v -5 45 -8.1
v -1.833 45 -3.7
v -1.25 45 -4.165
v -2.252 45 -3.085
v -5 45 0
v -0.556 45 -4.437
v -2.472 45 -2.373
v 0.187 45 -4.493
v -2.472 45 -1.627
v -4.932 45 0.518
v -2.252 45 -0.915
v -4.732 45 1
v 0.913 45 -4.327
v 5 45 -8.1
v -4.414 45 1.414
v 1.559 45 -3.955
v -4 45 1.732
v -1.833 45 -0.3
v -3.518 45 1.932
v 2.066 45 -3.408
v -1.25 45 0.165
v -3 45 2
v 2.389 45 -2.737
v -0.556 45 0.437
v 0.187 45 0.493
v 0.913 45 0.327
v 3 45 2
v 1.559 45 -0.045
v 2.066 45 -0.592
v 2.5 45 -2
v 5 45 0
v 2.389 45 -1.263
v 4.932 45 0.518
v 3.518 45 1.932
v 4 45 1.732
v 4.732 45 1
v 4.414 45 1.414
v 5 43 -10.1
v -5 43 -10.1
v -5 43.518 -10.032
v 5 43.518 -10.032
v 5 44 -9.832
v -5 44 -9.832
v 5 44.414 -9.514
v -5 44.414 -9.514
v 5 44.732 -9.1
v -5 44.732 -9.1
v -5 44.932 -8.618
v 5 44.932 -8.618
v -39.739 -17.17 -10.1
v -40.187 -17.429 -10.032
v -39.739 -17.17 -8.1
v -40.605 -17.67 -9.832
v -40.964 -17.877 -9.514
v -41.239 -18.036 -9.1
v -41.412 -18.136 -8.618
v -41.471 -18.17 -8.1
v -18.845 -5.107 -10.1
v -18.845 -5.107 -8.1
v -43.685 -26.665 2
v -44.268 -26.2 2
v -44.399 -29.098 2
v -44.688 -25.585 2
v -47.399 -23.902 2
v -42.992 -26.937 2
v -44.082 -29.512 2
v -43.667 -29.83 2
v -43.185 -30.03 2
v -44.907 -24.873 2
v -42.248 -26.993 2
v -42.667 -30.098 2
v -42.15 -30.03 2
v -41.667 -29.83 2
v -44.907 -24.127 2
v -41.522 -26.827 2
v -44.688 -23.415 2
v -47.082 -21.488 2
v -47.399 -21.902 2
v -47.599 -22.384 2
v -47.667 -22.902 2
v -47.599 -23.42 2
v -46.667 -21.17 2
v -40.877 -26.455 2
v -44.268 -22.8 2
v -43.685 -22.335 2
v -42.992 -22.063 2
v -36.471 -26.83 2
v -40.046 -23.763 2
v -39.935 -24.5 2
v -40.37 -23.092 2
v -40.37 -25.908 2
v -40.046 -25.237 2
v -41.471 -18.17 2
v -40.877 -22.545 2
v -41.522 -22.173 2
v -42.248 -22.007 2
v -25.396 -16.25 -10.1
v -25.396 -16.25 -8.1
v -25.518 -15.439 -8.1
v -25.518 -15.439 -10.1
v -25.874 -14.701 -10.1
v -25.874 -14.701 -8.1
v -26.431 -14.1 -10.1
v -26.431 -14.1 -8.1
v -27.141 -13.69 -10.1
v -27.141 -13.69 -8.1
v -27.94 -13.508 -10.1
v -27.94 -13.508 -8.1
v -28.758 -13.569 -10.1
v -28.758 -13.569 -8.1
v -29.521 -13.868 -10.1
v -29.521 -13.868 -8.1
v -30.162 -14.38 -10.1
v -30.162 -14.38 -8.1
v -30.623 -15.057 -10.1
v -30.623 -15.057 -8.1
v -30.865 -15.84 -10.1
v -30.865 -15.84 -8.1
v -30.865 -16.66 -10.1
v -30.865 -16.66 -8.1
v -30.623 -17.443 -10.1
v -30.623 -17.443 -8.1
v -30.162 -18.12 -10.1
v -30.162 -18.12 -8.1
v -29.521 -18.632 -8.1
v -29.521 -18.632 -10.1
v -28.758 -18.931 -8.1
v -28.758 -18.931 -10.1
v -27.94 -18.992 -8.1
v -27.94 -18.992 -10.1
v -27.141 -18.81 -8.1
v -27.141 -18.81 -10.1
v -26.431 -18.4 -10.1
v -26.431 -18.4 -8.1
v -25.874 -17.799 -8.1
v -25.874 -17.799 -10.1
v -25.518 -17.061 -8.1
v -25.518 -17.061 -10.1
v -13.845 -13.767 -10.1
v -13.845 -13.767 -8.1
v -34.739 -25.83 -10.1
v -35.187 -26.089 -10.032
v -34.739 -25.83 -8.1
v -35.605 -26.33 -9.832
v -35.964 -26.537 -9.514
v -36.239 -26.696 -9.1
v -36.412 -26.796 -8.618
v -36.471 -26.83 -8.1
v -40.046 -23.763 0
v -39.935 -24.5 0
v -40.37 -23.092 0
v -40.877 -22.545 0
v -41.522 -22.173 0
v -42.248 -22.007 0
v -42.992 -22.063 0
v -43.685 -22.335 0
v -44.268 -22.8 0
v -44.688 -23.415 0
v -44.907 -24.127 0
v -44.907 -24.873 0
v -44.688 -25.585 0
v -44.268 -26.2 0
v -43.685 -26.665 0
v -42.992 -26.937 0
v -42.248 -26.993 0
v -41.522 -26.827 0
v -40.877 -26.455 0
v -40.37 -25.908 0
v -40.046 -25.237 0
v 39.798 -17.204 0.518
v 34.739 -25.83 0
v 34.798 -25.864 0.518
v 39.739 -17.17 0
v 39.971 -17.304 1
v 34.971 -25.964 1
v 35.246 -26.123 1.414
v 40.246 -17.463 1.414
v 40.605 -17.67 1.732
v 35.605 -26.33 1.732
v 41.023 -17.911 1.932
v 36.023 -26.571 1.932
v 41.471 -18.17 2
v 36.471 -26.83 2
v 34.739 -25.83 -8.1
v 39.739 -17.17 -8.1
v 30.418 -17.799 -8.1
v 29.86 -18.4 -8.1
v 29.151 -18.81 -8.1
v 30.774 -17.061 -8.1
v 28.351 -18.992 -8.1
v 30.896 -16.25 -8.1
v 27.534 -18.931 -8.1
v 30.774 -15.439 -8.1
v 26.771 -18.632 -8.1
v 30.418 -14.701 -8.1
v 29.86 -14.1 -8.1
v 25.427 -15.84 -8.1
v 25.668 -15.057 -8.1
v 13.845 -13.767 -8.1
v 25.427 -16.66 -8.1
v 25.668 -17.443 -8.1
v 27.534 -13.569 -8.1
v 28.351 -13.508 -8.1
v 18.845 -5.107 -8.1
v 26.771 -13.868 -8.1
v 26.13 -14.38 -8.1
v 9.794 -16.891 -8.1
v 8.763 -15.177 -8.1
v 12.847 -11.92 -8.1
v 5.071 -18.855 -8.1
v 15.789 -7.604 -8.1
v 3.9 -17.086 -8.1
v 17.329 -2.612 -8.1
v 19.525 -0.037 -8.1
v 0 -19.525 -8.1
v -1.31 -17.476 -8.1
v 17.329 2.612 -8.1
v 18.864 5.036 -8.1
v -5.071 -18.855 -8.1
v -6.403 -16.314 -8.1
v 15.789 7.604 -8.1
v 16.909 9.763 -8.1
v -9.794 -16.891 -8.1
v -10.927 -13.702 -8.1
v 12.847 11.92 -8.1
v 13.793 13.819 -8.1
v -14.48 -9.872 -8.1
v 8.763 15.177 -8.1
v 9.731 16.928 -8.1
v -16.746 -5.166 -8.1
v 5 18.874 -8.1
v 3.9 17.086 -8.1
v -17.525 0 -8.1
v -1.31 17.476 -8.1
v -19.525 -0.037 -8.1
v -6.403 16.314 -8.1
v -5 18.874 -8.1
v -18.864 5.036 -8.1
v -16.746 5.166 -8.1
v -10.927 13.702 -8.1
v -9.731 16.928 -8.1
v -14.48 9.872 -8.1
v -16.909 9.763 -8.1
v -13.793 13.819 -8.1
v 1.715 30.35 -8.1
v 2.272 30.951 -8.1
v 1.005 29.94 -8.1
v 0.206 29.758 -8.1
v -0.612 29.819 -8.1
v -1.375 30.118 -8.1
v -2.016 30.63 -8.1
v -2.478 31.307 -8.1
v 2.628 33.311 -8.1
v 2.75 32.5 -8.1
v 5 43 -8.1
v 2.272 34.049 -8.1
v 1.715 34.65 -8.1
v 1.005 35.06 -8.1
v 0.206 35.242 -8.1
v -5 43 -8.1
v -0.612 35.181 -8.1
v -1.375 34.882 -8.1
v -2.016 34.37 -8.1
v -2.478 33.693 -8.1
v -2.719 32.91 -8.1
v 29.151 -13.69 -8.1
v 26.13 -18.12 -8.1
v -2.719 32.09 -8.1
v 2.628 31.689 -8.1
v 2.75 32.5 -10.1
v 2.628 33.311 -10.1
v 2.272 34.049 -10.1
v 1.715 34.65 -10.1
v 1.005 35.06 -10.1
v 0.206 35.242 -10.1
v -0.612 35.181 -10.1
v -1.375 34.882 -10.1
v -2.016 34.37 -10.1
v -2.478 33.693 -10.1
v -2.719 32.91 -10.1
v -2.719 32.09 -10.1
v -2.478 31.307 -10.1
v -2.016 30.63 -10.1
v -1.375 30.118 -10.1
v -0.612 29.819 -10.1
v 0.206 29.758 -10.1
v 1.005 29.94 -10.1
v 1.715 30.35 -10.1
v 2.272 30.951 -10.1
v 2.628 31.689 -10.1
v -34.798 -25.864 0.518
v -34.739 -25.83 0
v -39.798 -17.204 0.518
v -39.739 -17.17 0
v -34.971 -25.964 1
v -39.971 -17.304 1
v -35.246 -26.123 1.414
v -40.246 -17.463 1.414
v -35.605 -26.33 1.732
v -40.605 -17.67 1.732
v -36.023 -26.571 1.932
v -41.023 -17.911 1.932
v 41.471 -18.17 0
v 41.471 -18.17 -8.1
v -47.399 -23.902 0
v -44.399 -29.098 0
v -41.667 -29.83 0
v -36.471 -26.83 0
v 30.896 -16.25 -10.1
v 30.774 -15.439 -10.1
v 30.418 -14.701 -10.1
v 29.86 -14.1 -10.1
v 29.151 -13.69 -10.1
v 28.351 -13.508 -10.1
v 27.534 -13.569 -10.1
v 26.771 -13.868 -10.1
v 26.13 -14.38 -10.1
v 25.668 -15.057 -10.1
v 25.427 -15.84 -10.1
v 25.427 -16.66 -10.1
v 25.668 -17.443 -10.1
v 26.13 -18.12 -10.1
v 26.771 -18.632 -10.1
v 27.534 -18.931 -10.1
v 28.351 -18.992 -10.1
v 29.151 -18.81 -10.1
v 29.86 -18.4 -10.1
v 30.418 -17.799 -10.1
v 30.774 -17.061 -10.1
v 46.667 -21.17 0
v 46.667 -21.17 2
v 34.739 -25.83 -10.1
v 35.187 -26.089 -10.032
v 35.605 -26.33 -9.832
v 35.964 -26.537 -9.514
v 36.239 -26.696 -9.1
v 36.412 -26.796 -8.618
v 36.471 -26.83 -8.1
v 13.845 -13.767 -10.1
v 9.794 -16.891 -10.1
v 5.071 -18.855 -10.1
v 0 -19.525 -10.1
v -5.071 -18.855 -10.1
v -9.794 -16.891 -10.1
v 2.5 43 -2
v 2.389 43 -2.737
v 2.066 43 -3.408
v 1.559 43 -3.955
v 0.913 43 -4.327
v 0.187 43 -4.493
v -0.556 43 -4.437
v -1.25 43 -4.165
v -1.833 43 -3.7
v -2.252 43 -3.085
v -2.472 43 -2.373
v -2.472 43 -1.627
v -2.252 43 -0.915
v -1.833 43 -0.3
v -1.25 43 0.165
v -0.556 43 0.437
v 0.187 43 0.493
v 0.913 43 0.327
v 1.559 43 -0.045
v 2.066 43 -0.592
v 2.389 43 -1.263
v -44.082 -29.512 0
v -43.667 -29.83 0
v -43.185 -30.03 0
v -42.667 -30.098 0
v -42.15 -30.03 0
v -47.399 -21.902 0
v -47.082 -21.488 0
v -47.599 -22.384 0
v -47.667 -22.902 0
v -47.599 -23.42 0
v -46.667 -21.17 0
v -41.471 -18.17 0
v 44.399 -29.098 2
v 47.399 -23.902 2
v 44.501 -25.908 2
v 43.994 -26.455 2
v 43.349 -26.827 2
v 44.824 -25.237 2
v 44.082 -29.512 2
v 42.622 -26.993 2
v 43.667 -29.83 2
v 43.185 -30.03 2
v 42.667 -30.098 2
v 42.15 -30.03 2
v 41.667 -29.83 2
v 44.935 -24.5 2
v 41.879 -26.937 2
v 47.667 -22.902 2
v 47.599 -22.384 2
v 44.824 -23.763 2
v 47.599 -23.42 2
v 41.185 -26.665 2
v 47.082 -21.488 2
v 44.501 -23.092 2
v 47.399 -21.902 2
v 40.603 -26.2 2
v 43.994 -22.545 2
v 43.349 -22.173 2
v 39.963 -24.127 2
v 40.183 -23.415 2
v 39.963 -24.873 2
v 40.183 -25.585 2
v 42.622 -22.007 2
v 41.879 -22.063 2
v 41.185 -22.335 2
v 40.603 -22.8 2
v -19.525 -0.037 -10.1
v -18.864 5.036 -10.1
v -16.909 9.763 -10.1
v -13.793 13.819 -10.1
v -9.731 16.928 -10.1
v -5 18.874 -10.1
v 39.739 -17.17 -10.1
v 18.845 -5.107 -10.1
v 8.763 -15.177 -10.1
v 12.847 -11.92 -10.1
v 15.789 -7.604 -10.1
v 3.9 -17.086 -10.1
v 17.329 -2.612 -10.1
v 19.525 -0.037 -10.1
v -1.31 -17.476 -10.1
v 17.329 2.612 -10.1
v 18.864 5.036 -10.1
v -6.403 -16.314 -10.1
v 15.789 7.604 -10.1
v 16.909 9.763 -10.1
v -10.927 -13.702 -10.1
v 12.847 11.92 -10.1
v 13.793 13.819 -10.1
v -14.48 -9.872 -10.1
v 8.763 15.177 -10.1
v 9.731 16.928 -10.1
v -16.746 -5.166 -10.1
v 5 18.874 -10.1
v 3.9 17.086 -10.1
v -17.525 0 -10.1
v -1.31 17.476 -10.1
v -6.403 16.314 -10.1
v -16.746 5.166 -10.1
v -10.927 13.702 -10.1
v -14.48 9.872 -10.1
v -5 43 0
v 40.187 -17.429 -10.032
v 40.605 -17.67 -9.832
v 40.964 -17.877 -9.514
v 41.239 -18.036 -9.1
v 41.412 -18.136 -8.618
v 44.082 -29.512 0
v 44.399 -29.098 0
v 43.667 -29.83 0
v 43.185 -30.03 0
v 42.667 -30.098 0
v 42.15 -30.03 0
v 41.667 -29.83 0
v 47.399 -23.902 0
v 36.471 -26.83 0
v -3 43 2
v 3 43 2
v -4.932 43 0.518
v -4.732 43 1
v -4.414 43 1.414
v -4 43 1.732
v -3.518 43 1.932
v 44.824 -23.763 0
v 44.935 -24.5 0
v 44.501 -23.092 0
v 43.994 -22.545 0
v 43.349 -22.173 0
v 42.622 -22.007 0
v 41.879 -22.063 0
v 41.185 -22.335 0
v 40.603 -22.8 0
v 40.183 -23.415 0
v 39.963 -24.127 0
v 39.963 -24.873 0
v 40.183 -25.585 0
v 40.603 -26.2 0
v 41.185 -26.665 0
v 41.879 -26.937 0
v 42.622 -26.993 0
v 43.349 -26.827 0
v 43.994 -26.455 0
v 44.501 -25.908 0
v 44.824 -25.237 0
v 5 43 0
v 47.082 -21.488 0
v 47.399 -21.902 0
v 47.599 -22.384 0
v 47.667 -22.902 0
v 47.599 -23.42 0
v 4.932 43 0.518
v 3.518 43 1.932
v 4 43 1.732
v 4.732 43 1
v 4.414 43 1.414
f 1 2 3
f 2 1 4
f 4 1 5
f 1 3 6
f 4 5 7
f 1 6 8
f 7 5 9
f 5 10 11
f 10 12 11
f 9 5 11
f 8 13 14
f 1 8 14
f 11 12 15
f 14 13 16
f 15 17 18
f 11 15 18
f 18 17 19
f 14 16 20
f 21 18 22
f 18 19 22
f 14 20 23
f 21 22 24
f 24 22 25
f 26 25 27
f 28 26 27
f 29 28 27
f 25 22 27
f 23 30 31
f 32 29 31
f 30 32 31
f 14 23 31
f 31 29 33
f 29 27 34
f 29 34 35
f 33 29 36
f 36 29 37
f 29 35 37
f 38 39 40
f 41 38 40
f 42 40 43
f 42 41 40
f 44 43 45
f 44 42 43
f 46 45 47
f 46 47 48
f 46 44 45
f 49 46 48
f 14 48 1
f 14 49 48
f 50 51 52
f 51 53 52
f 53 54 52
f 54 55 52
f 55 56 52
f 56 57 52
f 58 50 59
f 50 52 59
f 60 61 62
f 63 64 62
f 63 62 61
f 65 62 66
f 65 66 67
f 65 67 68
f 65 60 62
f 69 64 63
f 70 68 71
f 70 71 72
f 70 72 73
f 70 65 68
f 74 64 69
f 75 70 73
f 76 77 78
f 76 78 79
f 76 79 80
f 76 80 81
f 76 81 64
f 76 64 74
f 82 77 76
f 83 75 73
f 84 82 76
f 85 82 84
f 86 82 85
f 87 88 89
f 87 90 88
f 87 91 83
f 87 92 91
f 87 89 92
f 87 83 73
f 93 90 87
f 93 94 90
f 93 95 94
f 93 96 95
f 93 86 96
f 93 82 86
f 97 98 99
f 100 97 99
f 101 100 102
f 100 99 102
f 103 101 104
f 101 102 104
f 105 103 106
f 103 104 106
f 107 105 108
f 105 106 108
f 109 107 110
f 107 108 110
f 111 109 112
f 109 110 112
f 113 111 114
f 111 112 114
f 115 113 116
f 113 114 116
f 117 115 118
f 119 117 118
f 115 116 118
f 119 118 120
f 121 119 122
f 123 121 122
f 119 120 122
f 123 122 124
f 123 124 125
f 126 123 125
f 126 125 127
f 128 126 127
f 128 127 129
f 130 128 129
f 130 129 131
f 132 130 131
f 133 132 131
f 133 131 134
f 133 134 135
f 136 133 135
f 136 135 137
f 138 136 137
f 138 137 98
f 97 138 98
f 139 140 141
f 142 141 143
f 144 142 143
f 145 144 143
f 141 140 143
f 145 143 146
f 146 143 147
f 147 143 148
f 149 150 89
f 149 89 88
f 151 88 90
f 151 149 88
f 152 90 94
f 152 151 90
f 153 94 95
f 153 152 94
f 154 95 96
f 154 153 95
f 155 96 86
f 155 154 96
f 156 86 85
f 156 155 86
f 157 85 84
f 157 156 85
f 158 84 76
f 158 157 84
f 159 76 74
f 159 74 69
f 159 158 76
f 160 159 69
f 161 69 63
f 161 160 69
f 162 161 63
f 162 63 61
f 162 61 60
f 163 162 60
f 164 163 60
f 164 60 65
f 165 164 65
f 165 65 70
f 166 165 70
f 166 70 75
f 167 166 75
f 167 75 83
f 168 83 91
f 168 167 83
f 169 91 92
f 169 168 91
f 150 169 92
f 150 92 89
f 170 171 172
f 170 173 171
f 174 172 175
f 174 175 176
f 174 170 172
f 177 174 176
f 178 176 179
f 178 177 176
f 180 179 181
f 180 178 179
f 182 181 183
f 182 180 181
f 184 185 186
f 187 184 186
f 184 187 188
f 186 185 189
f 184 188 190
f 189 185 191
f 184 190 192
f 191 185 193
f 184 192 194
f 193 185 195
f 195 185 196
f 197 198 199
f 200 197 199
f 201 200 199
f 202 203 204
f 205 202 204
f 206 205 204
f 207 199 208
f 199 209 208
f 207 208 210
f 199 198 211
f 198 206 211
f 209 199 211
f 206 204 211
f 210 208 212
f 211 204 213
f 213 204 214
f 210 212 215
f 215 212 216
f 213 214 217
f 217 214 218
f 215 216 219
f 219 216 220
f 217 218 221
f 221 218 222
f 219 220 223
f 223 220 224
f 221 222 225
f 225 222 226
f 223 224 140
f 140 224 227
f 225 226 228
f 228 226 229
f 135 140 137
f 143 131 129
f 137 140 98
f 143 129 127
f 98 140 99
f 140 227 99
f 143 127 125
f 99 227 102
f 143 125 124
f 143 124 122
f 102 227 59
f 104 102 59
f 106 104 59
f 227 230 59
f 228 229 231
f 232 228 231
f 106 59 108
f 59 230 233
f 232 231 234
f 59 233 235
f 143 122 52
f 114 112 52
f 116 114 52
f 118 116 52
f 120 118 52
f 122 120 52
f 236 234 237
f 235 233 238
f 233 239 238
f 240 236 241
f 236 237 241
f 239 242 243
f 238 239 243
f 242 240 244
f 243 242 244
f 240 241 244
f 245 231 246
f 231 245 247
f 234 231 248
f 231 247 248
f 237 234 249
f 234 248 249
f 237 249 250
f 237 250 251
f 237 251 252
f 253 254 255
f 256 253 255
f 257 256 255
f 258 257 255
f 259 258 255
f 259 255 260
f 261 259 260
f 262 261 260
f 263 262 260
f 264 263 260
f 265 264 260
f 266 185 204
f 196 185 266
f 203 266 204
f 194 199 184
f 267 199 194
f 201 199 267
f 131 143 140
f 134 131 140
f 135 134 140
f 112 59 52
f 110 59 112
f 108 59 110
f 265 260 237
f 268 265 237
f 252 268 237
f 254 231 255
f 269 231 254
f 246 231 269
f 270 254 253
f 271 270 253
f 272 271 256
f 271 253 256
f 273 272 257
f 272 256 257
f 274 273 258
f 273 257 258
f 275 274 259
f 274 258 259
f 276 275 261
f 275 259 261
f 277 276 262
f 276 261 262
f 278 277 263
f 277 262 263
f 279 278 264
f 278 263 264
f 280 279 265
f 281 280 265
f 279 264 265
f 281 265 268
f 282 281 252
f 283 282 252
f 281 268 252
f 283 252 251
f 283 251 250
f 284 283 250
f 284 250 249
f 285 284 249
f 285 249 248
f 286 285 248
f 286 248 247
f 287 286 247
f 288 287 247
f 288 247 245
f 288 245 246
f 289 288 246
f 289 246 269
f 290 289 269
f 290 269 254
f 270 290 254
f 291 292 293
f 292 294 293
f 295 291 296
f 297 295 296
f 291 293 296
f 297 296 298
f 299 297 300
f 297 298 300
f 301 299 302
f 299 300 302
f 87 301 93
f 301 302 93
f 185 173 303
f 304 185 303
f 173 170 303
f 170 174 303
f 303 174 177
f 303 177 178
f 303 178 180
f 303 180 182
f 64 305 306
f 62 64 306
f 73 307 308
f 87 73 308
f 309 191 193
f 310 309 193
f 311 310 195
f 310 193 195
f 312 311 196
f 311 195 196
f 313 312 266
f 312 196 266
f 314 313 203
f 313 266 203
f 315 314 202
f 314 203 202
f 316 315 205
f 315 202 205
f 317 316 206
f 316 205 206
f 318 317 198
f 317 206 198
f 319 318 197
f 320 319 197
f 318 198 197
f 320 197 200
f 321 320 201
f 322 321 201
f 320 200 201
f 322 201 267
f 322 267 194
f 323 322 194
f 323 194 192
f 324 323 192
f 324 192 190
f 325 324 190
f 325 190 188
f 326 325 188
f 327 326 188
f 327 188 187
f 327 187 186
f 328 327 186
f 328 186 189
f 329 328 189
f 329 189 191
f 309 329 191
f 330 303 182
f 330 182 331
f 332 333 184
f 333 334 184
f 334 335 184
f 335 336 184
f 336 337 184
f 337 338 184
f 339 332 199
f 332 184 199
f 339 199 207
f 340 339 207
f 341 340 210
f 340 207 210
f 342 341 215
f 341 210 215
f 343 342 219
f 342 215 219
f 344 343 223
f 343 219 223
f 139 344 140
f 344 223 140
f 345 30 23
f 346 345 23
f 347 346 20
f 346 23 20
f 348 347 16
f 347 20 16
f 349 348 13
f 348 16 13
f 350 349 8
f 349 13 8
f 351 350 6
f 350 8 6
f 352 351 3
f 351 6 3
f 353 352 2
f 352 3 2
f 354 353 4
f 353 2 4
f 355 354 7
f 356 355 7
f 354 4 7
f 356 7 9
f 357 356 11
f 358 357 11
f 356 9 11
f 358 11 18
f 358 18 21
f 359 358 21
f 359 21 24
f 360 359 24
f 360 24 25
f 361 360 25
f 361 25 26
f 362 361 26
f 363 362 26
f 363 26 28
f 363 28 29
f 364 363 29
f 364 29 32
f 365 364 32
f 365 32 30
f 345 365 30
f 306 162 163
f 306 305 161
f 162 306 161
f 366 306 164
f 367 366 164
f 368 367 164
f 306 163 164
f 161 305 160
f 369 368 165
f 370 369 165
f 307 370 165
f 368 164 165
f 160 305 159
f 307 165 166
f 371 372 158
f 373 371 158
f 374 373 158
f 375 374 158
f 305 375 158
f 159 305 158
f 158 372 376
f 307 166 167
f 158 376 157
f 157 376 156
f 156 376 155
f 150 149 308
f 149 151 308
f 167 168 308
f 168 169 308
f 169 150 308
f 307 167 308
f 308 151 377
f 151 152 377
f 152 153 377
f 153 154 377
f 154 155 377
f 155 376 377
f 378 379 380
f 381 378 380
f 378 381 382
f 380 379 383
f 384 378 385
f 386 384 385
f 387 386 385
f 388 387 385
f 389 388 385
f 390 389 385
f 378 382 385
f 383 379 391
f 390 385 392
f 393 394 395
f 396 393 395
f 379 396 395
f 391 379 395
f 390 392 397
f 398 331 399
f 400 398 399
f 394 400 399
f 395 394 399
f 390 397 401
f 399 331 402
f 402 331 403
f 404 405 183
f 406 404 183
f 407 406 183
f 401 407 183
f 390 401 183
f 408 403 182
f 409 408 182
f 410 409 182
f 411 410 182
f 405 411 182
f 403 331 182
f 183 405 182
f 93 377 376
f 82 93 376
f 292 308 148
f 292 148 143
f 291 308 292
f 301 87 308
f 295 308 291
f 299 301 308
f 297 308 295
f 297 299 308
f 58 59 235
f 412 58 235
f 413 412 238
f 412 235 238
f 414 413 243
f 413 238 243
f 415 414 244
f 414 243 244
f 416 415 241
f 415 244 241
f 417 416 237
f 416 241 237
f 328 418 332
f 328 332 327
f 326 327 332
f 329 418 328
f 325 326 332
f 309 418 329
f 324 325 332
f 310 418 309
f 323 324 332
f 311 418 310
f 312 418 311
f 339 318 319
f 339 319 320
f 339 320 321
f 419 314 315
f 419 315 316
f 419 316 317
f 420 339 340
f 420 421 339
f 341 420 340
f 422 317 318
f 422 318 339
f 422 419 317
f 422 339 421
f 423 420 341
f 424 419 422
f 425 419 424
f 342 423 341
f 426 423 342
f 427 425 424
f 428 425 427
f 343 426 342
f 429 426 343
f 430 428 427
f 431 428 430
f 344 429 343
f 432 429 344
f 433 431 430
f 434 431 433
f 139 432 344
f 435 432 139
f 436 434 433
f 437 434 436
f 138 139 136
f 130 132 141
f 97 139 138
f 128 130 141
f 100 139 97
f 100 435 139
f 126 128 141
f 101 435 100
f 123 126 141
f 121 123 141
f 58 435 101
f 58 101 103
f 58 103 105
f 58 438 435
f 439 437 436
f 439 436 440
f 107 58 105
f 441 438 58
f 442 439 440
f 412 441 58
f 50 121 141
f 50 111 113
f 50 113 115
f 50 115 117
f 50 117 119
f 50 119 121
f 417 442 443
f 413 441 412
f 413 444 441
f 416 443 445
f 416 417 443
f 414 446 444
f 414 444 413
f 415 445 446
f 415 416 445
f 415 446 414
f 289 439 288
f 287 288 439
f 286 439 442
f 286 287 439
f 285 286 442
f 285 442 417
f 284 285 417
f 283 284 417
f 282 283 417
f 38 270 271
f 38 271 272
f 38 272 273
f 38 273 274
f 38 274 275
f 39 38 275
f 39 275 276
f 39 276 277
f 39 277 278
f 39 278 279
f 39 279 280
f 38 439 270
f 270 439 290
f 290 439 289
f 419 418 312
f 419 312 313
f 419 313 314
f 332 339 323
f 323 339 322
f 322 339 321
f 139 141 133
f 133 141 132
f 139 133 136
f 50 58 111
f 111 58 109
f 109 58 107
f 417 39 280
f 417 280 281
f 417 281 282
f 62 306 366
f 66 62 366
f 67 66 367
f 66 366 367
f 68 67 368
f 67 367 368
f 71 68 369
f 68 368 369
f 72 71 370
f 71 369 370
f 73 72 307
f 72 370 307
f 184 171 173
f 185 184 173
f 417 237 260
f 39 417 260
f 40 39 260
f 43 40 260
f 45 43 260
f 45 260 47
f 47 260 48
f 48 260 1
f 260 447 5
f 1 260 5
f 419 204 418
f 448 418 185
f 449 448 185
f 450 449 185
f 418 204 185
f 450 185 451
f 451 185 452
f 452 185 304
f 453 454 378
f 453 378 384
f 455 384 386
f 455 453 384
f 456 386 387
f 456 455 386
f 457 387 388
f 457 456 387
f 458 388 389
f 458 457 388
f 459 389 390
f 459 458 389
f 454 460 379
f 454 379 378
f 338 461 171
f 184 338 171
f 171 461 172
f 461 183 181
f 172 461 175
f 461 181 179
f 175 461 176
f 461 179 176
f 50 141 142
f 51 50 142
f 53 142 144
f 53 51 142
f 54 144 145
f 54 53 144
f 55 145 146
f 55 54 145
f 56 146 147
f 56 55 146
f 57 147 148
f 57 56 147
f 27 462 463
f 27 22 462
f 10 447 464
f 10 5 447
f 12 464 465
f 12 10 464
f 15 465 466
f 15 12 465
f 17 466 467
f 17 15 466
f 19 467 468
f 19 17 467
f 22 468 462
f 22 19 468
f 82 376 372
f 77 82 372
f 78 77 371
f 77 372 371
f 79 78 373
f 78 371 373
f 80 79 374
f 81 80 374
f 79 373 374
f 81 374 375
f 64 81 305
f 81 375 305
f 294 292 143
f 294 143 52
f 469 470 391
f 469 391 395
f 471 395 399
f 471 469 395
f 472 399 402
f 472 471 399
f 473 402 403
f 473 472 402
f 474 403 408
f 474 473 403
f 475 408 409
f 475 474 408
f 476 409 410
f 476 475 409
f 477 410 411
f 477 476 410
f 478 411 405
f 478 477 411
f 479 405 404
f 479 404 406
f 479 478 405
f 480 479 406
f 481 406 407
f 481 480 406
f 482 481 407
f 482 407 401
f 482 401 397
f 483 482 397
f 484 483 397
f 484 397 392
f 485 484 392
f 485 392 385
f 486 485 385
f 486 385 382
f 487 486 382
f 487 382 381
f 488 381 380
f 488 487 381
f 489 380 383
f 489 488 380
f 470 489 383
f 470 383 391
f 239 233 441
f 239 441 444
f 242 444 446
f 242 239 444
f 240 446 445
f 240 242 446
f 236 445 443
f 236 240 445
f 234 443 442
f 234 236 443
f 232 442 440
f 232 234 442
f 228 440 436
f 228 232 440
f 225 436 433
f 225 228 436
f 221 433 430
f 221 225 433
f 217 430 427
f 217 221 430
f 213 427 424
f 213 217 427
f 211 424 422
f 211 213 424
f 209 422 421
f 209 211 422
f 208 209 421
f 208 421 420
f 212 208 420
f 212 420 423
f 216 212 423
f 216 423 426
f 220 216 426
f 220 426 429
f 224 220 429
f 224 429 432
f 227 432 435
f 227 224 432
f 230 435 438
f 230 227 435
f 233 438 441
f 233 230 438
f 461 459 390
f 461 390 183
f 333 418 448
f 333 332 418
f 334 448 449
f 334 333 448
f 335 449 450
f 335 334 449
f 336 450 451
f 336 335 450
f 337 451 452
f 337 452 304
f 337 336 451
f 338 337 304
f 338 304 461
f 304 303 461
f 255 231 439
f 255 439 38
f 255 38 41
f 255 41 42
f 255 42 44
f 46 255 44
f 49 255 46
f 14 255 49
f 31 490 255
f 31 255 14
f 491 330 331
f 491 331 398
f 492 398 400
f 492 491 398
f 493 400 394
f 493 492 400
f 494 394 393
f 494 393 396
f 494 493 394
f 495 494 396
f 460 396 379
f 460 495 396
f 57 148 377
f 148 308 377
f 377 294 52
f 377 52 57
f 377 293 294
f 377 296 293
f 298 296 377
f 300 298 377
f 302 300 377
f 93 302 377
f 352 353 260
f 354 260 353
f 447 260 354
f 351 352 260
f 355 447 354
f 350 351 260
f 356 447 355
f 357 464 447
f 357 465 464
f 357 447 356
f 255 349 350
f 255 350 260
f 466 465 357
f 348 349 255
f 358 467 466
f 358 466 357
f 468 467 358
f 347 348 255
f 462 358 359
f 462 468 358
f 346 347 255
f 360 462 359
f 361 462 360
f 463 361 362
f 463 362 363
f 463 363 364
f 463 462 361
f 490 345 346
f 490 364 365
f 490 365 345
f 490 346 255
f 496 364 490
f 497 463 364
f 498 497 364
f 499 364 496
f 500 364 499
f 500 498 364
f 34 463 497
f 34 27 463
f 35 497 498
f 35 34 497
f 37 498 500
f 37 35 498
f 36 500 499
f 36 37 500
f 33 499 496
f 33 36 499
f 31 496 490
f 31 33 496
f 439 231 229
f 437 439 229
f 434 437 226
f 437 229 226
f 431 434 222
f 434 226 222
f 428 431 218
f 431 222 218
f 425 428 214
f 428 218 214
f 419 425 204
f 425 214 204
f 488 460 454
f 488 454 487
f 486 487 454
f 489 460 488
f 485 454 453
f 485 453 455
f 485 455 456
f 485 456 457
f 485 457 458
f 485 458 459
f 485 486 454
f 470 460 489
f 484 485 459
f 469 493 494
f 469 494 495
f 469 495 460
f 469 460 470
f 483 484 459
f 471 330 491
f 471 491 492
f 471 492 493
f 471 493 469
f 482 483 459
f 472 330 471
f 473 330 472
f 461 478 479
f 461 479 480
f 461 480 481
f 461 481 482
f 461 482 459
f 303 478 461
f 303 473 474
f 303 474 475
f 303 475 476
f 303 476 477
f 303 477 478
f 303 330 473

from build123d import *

# Parameters (mm, degrees)
SKETCH1_R             = 2.5
BOSS_EXTRUDE1_DEPTH   = 2
BOSS_EXTRUDE1_2_DEPTH = 2
BOSS_EXTRUDE2_DEPTH   = 10.1
SKETCH3_R             = 17.525
BOSS_EXTRUDE3_DEPTH   = 2
SKETCH4_R             = 2.75
CUT_EXTRUDE1_DEPTH    = 3
SKETCH2_3_W           = 10
SKETCH2_3_H           = 2
BOSS_EXTRUDE4_DEPTH   = 12.1
CUT_EXTRUDE2_REACH    = 77.098
SKETCH5_R             = 2.5
FILLET2_R             = 2
SKETCH6_R             = 2.75
CUT_EXTRUDE3_DEPTH    = 10


with BuildPart() as part:
    # Sketch1 → Boss-Extrude1 (new body)
    with BuildSketch(Plane.XY):
        with BuildLine():
            Line((-47.399346401, -23.901923789), (-44.399346401, -29.098076211))
            ThreePointArc((-44.399346401, -29.098076211), (-43.184933683, -30.029927864), (-41.667295593, -29.830127019))
            Line((-41.667295593, -29.830127019), (-36.47114317, -26.830127019))
            Line((-36.47114317, -26.830127019), (-41.47114317, -18.169872981))
            Line((-41.47114317, -18.169872981), (-46.667295593, -21.169872981))
            ThreePointArc((-46.667295593, -21.169872981), (-47.599147246, -22.384285698), (-47.399346401, -23.901923789))
        make_face()
        with Locations((-42.435244785, -24.5)):
            Circle(SKETCH1_R, mode=Mode.SUBTRACT)
    extrude(amount=BOSS_EXTRUDE1_DEPTH)



with BuildPart() as body_2:
    # Sketch1 → Boss-Extrude1 2 (new body)
    with BuildSketch(Plane.XY):
        with BuildLine():
            Line((41.667295593, -29.830127019), (36.47114317, -26.830127019))
            Line((36.47114317, -26.830127019), (41.47114317, -18.169872981))
            Line((41.47114317, -18.169872981), (46.667295593, -21.169872981))
            ThreePointArc((46.667295593, -21.169872981), (47.599147246, -22.384285698), (47.399346401, -23.901923789))
            Line((47.399346401, -23.901923789), (44.399346401, -29.098076211))
            ThreePointArc((44.399346401, -29.098076211), (43.184933683, -30.029927864), (41.667295593, -29.830127019))
        make_face()
        with Locations((42.435244785, -24.5)):
            Circle(SKETCH1_R, mode=Mode.SUBTRACT)
    extrude(amount=BOSS_EXTRUDE1_2_DEPTH)


with BuildPart() as part_1:
    add(part.part)

    add(body_2.part)  # Boss-Extrude2 merges body 2
    # Sketch2 → Boss-Extrude2 (add)
    with BuildSketch(Plane.XY.offset(2)):
        Polygon((41.47114317, -18.169872981), (36.47114317, -26.830127019), (34.739092363, -25.830127019), (39.739092363, -17.169872981), align=None)
        Polygon((-34.739092363, -25.830127019), (-39.739092363, -17.169872981), (-41.47114317, -18.169872981), (-36.47114317, -26.830127019), align=None)
    extrude(amount=-BOSS_EXTRUDE2_DEPTH)

    # Sketch3 → Boss-Extrude3 (add)
    with BuildSketch(Plane(origin=(0, 0, -8.1), x_dir=(-1, 0, 0), z_dir=(0, 0, -1))):
        with BuildLine():
            Line((-41.47114317, -18.169872981), (-36.47114317, -26.830127019))
            Line((-36.47114317, -26.830127019), (-13.845311828, -13.767097203))
            ThreePointArc((-13.845311828, -13.767097203), (0, -19.525), (13.845311828, -13.767097203))
            Line((13.845311828, -13.767097203), (36.47114317, -26.830127019))
            Line((36.47114317, -26.830127019), (41.47114317, -18.169872981))
            Line((41.47114317, -18.169872981), (18.845311828, -5.106843165))
            ThreePointArc((18.845311828, -5.106843165), (16.909146009, 9.7625), (5, 18.873940368))
            Line((5, 18.873940368), (5, 45))
            Line((5, 45), (-5, 45))
            Line((-5, 45), (-5, 18.873940368))
            ThreePointArc((-5, 18.873940368), (-16.909146009, 9.7625), (-18.845311828, -5.106843165))
            Line((-18.845311828, -5.106843165), (-41.47114317, -18.169872981))
        make_face()
        Circle(SKETCH3_R, mode=Mode.SUBTRACT)
    extrude(amount=BOSS_EXTRUDE3_DEPTH)

    # Sketch4 → Cut-Extrude1 (cut, through all)
    with BuildSketch(Plane.XY.offset(-8.1)):
        with Locations((0, 32.5)):
            Circle(SKETCH4_R)
    extrude(amount=-CUT_EXTRUDE1_DEPTH, mode=Mode.SUBTRACT)

    # Sketch2<3> → Boss-Extrude4 (add)
    with BuildSketch(Plane.XY.offset(2)):
        with Locations((0, 44)):
            Rectangle(SKETCH2_3_W, SKETCH2_3_H)
    extrude(amount=-BOSS_EXTRUDE4_DEPTH)

    # Sketch5 → Cut-Extrude2 (cut, up to next)
    with BuildSketch(Plane(origin=(0, 45, 0), x_dir=(1, 0, 0), z_dir=(0, 1, 0)), mode=Mode.PRIVATE) as cut_extrude2_sk1:
        with Locations((0, 2)):
            Circle(SKETCH5_R)
    cut_extrude2_tool1 = extrude(cut_extrude2_sk1.sketch, amount=-CUT_EXTRUDE2_REACH, mode=Mode.PRIVATE) & part_1.part
    add(cut_extrude2_tool1.solids().sort_by_distance((0, 45, -2))[0], mode=Mode.SUBTRACT)

    # Fillet2
    fillet2_edges = [part_1.edges().sort_by_distance(p)[0] for p in [
        (-37.239092363, -21.5, 2),
        (38.97114317, -22.5, -10.1),
        (-38.97114317, -22.5, -10.1),
        (0, 45, -10.1),
        (37.239092363, -21.5, 2),
        (5, 44, 2),
        (-5, 44, 2),
    ]]
    fillet(fillet2_edges, radius=FILLET2_R)

    # Sketch6 → Cut-Extrude3 (cut)
    with BuildSketch(Plane.XY.offset(-8.1)):
        with Locations((0, 32.5)):
            Circle(SKETCH6_R)
        with Locations((28.145825623, -16.25)):
            Circle(SKETCH6_R)
        with Locations((-28.145825623, -16.25)):
            Circle(SKETCH6_R)
    extrude(amount=-CUT_EXTRUDE3_DEPTH, mode=Mode.SUBTRACT)


solid = part_1.part
